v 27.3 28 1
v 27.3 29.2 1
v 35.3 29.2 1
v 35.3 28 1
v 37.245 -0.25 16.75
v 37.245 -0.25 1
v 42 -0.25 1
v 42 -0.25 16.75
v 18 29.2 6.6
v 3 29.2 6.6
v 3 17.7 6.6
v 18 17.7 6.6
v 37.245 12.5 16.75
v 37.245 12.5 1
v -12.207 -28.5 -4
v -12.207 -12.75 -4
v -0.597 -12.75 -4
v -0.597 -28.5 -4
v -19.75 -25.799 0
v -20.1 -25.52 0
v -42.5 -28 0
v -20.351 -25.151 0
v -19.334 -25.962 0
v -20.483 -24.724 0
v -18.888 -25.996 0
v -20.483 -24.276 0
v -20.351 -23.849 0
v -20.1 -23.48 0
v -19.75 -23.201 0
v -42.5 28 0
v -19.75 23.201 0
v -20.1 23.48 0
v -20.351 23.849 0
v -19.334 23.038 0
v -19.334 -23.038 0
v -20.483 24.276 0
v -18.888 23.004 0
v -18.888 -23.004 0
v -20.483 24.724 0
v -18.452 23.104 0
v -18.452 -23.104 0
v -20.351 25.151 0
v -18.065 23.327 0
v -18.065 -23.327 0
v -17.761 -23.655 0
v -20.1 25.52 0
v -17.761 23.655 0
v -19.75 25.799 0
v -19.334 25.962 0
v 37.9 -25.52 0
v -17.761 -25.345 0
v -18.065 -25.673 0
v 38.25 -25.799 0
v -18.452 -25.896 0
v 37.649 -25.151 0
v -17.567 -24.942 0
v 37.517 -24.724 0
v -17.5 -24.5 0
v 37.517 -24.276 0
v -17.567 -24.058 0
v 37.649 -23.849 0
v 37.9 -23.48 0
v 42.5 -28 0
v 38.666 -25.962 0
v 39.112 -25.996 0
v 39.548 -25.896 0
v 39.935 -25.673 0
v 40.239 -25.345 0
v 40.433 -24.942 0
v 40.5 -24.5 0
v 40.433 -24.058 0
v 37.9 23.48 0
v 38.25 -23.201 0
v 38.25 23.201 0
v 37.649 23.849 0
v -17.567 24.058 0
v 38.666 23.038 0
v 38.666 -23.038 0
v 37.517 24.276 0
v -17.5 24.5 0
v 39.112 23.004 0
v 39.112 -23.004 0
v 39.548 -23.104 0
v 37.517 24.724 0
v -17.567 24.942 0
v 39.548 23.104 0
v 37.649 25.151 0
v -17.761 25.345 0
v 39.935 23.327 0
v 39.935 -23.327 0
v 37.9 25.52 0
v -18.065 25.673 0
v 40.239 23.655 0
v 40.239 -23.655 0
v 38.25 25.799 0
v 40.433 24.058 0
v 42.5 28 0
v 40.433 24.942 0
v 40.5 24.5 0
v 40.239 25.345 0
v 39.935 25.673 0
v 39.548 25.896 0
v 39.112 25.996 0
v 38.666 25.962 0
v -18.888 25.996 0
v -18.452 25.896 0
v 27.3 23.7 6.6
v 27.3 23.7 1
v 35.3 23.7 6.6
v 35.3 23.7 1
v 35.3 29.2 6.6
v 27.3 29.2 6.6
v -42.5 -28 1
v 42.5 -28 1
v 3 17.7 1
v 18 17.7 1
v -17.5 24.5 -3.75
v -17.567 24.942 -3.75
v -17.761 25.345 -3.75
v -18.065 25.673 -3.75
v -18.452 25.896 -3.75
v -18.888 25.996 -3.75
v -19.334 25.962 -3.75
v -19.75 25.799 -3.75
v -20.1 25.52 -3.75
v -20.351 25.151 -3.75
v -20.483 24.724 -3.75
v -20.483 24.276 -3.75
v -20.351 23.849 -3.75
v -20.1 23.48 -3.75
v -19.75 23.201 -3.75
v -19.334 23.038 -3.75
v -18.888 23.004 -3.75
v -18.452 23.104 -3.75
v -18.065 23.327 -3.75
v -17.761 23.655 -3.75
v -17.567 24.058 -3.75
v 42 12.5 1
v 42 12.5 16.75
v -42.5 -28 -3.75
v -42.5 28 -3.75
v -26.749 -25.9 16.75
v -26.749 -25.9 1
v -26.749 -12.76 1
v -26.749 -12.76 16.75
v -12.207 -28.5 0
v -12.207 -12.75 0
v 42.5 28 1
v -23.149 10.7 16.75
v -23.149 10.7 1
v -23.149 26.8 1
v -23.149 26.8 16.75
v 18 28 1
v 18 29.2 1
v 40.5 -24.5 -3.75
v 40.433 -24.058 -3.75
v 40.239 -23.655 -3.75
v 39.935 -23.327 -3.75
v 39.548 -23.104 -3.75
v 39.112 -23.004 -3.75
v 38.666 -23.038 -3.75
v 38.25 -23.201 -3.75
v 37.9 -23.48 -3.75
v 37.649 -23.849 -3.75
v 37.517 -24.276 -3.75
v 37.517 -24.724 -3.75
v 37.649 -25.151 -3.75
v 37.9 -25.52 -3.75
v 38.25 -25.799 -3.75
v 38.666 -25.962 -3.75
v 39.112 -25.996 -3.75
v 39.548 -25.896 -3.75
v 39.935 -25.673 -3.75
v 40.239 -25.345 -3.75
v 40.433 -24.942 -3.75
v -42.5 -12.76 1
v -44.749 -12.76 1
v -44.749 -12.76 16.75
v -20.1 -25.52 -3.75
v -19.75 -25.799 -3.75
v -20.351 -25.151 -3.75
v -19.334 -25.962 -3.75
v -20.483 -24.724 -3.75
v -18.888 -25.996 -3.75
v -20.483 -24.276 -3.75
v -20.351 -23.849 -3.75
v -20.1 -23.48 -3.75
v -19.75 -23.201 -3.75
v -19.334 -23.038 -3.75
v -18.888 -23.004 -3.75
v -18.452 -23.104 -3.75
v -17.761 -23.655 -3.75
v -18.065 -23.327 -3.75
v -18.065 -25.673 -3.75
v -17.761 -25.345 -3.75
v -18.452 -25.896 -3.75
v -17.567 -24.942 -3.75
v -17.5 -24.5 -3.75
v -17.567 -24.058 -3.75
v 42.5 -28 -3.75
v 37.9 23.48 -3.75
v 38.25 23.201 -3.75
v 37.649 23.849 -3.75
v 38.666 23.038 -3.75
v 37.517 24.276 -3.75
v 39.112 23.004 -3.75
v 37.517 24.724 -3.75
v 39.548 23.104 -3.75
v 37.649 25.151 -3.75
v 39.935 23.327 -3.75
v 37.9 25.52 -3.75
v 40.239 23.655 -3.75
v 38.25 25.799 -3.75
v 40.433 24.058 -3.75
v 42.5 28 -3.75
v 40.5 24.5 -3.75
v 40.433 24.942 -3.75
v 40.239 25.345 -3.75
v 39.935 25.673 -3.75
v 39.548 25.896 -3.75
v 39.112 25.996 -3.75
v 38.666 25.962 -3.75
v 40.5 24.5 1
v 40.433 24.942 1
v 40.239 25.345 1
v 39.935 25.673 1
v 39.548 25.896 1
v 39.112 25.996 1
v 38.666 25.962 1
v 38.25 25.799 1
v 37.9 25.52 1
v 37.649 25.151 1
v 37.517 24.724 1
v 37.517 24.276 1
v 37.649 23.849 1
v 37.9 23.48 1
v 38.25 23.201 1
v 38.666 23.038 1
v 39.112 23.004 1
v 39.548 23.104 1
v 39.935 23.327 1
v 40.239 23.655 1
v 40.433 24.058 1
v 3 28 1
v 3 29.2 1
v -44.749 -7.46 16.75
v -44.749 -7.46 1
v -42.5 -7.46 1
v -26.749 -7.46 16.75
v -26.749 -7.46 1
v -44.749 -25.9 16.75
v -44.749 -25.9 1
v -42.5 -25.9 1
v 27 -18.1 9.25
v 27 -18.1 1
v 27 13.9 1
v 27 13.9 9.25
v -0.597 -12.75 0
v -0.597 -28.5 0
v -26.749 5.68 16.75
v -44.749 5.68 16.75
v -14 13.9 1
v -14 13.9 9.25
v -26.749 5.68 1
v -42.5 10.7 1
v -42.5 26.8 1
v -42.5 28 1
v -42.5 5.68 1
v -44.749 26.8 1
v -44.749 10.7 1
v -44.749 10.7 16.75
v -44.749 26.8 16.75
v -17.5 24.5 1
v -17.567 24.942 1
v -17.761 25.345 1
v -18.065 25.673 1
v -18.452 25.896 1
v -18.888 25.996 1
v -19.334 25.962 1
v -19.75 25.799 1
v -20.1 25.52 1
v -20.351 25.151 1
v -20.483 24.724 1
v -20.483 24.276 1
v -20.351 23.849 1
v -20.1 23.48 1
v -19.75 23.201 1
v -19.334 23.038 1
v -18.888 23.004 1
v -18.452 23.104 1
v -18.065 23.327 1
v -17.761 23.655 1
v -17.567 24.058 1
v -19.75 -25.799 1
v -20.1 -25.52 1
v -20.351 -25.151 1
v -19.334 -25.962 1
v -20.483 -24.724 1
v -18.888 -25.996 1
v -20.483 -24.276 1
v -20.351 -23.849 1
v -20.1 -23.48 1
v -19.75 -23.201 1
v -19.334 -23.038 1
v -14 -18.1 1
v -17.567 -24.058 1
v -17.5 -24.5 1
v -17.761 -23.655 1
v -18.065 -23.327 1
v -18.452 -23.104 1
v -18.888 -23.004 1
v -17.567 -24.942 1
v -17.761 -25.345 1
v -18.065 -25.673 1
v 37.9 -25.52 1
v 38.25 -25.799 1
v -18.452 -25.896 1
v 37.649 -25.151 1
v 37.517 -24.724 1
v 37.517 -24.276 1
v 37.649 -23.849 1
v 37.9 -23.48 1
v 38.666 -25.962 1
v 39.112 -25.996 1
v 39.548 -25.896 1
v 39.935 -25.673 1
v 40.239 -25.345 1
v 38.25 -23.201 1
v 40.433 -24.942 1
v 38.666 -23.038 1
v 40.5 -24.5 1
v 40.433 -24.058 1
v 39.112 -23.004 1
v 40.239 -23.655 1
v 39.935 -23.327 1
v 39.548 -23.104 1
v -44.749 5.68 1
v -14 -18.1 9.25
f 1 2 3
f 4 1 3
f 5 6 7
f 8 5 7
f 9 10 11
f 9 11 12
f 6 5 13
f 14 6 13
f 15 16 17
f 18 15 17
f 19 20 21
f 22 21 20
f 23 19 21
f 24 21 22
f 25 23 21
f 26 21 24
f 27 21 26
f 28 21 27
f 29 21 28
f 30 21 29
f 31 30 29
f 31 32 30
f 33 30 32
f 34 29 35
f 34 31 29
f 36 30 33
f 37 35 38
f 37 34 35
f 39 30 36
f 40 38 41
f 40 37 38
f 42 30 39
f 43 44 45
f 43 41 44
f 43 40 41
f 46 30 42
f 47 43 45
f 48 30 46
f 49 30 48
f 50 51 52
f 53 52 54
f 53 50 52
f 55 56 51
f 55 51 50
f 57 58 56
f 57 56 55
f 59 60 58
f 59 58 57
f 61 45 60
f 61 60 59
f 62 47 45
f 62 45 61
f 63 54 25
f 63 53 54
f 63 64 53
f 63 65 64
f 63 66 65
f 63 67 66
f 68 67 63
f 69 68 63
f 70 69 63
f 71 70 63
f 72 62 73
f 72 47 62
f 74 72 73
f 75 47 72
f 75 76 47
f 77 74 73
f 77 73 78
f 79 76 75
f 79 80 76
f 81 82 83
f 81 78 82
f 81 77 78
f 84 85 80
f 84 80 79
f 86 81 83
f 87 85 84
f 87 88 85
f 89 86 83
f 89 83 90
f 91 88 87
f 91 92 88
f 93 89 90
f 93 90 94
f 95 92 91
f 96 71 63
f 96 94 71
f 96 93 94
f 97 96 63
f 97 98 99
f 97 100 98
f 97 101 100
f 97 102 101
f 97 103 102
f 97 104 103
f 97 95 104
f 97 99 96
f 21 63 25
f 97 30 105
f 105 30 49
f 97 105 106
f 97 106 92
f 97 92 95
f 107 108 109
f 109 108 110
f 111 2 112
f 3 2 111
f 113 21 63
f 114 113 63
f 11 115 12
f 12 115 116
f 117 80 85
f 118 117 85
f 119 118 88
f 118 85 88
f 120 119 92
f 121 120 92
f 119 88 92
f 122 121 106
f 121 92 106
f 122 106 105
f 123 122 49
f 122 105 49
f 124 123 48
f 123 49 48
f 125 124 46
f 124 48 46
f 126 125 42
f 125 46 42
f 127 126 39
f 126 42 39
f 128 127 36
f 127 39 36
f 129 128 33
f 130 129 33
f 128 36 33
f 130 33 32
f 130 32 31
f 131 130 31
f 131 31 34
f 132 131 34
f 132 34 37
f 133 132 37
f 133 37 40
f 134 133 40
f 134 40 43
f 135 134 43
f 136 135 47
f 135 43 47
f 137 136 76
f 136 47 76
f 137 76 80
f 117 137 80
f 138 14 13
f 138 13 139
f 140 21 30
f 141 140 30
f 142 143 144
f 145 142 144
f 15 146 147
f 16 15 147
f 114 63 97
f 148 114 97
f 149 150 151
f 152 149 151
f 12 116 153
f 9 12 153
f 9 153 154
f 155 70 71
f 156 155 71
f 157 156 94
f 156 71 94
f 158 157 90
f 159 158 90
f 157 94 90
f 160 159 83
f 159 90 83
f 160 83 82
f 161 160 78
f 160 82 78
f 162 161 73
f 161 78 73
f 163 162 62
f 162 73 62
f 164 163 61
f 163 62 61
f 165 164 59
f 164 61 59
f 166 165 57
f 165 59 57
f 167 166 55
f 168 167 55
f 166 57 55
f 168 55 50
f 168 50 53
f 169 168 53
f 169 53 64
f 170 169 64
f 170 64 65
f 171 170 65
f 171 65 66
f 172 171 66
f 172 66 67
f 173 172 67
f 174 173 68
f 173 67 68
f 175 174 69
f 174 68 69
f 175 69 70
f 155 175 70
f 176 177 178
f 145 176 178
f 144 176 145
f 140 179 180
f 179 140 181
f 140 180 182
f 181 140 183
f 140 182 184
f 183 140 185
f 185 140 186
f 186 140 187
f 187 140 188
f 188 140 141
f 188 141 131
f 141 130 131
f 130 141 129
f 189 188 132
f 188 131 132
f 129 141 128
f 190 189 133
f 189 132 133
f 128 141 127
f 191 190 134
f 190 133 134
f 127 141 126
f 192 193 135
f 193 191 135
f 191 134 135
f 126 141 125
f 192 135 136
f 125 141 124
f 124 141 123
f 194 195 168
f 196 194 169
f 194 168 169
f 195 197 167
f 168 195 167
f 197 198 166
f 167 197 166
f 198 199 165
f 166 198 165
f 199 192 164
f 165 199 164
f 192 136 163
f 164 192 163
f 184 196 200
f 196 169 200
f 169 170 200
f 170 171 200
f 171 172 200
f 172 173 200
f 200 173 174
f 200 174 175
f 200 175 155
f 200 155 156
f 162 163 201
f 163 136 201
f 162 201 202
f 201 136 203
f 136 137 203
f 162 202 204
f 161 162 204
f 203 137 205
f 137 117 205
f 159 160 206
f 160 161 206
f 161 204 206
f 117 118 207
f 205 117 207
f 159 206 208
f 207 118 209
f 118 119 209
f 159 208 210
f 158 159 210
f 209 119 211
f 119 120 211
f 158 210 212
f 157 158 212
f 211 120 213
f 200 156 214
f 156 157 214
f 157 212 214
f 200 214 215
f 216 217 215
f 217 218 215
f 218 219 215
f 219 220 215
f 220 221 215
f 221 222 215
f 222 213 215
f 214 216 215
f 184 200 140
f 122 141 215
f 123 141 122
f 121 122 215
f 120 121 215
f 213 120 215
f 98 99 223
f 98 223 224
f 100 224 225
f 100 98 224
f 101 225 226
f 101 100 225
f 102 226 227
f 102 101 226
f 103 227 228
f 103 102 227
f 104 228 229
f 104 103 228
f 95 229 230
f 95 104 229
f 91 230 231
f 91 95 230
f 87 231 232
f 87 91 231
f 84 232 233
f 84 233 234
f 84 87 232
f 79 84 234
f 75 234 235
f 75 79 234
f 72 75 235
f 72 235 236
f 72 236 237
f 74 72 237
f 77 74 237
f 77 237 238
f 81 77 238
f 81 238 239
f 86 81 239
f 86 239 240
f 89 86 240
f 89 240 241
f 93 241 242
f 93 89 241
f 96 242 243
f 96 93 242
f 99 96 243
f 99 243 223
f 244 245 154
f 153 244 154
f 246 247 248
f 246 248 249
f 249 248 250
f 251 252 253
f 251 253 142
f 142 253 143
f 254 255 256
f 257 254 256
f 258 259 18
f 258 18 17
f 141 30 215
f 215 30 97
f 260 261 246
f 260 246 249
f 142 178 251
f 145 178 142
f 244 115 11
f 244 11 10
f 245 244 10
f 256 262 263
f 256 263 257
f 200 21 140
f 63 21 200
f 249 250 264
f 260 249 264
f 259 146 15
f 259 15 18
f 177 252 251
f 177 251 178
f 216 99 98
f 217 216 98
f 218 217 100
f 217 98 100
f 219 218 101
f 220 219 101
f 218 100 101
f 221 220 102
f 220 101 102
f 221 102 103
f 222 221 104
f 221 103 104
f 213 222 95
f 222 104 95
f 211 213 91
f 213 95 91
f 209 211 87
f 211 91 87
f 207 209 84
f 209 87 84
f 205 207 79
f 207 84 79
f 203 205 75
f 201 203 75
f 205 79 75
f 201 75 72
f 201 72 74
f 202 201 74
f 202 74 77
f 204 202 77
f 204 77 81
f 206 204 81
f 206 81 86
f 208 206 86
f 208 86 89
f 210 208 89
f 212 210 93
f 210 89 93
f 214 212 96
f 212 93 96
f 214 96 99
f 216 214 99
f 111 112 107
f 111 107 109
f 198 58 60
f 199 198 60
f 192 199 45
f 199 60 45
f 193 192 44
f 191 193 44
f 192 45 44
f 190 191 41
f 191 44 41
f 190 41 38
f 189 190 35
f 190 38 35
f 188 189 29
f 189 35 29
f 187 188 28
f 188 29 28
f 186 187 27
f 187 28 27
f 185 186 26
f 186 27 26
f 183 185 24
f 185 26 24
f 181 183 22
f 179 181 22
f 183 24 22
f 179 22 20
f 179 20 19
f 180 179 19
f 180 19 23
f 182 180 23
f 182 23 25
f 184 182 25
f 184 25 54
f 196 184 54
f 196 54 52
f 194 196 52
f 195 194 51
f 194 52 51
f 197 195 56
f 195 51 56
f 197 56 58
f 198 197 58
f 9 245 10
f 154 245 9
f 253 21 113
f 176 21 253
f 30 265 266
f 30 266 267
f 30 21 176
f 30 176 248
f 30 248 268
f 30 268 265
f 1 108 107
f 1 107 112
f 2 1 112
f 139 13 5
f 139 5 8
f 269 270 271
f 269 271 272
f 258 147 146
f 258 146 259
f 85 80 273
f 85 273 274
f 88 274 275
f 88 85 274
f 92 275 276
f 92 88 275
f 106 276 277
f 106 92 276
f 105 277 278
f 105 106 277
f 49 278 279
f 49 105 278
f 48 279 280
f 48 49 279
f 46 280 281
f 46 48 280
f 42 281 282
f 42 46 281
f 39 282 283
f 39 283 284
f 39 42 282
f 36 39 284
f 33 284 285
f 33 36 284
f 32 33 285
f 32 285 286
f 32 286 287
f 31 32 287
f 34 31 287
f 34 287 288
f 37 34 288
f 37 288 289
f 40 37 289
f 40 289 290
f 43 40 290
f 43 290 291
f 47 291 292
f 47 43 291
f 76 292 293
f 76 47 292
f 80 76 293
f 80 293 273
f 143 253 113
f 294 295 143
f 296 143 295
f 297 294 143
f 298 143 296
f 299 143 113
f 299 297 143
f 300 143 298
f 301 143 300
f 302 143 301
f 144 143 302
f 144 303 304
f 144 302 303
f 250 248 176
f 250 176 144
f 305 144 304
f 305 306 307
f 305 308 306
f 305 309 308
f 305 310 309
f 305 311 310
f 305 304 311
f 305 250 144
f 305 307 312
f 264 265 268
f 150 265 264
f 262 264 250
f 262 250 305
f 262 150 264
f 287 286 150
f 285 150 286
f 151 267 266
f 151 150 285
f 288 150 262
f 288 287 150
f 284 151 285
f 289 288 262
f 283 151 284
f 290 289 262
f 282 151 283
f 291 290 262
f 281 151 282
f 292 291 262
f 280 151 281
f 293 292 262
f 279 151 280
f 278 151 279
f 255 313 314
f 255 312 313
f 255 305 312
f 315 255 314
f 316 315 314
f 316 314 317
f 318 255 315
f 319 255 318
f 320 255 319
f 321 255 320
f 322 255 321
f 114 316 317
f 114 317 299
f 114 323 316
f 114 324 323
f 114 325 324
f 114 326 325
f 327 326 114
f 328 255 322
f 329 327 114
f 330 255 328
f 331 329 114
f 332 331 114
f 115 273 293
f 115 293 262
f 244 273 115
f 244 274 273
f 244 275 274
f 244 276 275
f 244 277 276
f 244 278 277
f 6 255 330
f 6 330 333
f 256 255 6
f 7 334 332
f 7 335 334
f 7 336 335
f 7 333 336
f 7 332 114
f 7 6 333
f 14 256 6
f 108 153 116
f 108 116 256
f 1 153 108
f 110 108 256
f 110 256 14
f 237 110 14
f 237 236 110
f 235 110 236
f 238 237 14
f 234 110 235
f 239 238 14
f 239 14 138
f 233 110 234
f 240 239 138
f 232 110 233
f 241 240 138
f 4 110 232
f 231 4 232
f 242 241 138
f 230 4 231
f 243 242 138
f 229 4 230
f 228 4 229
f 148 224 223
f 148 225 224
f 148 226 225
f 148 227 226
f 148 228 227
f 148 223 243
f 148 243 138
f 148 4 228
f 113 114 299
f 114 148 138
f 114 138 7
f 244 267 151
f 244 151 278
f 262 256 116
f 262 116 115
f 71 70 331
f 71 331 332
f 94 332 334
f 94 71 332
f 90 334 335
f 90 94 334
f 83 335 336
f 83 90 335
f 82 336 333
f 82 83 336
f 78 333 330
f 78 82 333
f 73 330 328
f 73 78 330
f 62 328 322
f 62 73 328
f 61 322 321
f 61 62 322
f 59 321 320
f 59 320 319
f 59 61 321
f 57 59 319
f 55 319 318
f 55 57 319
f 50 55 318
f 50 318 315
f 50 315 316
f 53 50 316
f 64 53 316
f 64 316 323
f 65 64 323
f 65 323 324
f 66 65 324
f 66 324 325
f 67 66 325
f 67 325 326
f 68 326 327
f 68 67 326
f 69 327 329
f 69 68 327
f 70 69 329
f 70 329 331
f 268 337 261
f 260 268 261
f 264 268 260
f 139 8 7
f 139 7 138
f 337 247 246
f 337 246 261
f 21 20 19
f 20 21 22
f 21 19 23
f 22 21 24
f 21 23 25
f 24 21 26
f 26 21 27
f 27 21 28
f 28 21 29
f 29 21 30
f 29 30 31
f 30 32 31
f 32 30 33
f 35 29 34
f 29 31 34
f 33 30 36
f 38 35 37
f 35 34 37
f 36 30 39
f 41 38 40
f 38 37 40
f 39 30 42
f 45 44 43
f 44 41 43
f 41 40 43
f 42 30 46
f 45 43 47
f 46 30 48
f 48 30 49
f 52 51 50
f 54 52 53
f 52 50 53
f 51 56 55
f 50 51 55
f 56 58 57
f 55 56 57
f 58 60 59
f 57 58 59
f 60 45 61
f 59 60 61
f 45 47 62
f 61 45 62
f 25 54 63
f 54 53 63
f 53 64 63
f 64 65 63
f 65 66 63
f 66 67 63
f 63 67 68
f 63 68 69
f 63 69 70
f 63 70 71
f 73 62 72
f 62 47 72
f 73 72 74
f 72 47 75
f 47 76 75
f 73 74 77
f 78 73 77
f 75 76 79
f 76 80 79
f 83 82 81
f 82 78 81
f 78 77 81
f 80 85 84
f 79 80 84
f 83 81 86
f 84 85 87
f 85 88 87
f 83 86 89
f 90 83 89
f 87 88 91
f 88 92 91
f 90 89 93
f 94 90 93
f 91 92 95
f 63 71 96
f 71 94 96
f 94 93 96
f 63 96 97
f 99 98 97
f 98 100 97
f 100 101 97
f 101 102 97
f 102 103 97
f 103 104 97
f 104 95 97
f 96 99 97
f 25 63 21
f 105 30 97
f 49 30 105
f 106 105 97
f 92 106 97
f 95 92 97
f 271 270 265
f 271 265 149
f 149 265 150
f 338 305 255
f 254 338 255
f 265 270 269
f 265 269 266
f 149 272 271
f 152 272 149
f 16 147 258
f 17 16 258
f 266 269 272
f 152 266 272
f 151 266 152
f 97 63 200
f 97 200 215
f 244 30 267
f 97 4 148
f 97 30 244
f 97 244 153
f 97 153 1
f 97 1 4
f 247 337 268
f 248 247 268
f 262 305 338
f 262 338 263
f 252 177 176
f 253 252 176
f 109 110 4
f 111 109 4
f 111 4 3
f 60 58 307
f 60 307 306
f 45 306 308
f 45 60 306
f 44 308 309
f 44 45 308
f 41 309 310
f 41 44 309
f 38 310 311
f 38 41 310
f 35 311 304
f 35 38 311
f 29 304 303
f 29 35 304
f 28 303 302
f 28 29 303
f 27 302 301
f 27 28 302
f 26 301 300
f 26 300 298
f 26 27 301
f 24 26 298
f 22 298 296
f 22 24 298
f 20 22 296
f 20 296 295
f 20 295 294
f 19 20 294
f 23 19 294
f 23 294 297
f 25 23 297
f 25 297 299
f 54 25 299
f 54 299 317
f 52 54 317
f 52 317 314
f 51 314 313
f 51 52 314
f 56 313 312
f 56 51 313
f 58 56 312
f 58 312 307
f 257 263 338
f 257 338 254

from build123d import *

# Parameters (mm, degrees)
SKETCH1_W           = 85
SKETCH1_H           = 56
SKETCH1_R           = 1.5
BOSS_EXTRUDE1_DEPTH = 1
SKETCH1_2_W         = 85
SKETCH1_2_H         = 56
SKETCH1_2_R         = 1.5
BOSS_EXTRUDE2_DEPTH = 3.75
SKETCH3_W           = 41
SKETCH3_H           = 32
BOSS_EXTRUDE3_DEPTH = 8.25
SKETCH4_W           = 18
SKETCH4_H           = 13.14
SKETCH4_W_2         = 4.755
SKETCH4_H_2         = 12.75
SKETCH4_W_3         = 21.6
SKETCH4_H_3         = 16.1
BOSS_EXTRUDE4_DEPTH = 15.75
SKETCH5_W           = 15
SKETCH5_H           = 11.5
SKETCH5_W_2         = 8
SKETCH5_H_2         = 5.5
BOSS_EXTRUDE5_DEPTH = 5.6
SKETCH6_W           = 11.61
SKETCH6_H           = 15.75
BOSS_EXTRUDE6_DEPTH = 4


with BuildPart() as part:
    # Sketch1 → Boss-Extrude1 (new body)
    with BuildSketch(Plane.XY):
        Rectangle(SKETCH1_W, SKETCH1_H)
        with Locations((-19.000000078, 24.5)):
            Circle(SKETCH1_R, mode=Mode.SUBTRACT)
        with Locations((-19.000000078, -24.5)):
            Circle(SKETCH1_R, mode=Mode.SUBTRACT)
        with Locations((39, 24.5)):
            Circle(SKETCH1_R, mode=Mode.SUBTRACT)
        with Locations((39, -24.5)):
            Circle(SKETCH1_R, mode=Mode.SUBTRACT)
    extrude(amount=BOSS_EXTRUDE1_DEPTH)

    # Sketch3 → Boss-Extrude3 (add)
    with BuildSketch(Plane.XY.offset(1)):
        with Locations((6.5, -2.1)):
            Rectangle(SKETCH3_W, SKETCH3_H)
    extrude(amount=BOSS_EXTRUDE3_DEPTH)

    # Sketch4 → Boss-Extrude4 (add)
    with BuildSketch(Plane.XY.offset(1)):
        with Locations((-35.74947609, -0.89)):
            Rectangle(SKETCH4_W, SKETCH4_H)
        with Locations((-35.74947609, -19.33)):
            Rectangle(SKETCH4_W, SKETCH4_H)
        with Locations((39.6225, 6.125)):
            Rectangle(SKETCH4_W_2, SKETCH4_H_2)
        with Locations((-33.94947609, 18.75)):
            Rectangle(SKETCH4_W_3, SKETCH4_H_3)
    extrude(amount=BOSS_EXTRUDE4_DEPTH)

    # Sketch5 → Boss-Extrude5 (add)
    with BuildSketch(Plane.XY.offset(1)):
        with Locations((10.5, 23.45)):
            Rectangle(SKETCH5_W, SKETCH5_H)
        with Locations((31.3, 26.45)):
            Rectangle(SKETCH5_W_2, SKETCH5_H_2)
    extrude(amount=BOSS_EXTRUDE5_DEPTH)


with BuildPart() as body_2:
    # Sketch1<2> → Boss-Extrude2 (new body)
    with BuildSketch(Plane.XY):
        Rectangle(SKETCH1_2_W, SKETCH1_2_H)
        with Locations((-19.000000078, 24.5)):
            Circle(SKETCH1_2_R, mode=Mode.SUBTRACT)
        with Locations((-19.000000078, -24.5)):
            Circle(SKETCH1_2_R, mode=Mode.SUBTRACT)
        with Locations((39, 24.5)):
            Circle(SKETCH1_2_R, mode=Mode.SUBTRACT)
        with Locations((39, -24.5)):
            Circle(SKETCH1_2_R, mode=Mode.SUBTRACT)
    extrude(amount=-BOSS_EXTRUDE2_DEPTH)


with BuildPart() as body_3:
    # Sketch6 → Boss-Extrude6 (new body)
    with BuildSketch(Plane.XY):
        with Locations((-6.401910681, -20.625)):
            Rectangle(SKETCH6_W, SKETCH6_H)
    extrude(amount=-BOSS_EXTRUDE6_DEPTH)


solid = Compound([part.part, body_2.part, body_3.part])
